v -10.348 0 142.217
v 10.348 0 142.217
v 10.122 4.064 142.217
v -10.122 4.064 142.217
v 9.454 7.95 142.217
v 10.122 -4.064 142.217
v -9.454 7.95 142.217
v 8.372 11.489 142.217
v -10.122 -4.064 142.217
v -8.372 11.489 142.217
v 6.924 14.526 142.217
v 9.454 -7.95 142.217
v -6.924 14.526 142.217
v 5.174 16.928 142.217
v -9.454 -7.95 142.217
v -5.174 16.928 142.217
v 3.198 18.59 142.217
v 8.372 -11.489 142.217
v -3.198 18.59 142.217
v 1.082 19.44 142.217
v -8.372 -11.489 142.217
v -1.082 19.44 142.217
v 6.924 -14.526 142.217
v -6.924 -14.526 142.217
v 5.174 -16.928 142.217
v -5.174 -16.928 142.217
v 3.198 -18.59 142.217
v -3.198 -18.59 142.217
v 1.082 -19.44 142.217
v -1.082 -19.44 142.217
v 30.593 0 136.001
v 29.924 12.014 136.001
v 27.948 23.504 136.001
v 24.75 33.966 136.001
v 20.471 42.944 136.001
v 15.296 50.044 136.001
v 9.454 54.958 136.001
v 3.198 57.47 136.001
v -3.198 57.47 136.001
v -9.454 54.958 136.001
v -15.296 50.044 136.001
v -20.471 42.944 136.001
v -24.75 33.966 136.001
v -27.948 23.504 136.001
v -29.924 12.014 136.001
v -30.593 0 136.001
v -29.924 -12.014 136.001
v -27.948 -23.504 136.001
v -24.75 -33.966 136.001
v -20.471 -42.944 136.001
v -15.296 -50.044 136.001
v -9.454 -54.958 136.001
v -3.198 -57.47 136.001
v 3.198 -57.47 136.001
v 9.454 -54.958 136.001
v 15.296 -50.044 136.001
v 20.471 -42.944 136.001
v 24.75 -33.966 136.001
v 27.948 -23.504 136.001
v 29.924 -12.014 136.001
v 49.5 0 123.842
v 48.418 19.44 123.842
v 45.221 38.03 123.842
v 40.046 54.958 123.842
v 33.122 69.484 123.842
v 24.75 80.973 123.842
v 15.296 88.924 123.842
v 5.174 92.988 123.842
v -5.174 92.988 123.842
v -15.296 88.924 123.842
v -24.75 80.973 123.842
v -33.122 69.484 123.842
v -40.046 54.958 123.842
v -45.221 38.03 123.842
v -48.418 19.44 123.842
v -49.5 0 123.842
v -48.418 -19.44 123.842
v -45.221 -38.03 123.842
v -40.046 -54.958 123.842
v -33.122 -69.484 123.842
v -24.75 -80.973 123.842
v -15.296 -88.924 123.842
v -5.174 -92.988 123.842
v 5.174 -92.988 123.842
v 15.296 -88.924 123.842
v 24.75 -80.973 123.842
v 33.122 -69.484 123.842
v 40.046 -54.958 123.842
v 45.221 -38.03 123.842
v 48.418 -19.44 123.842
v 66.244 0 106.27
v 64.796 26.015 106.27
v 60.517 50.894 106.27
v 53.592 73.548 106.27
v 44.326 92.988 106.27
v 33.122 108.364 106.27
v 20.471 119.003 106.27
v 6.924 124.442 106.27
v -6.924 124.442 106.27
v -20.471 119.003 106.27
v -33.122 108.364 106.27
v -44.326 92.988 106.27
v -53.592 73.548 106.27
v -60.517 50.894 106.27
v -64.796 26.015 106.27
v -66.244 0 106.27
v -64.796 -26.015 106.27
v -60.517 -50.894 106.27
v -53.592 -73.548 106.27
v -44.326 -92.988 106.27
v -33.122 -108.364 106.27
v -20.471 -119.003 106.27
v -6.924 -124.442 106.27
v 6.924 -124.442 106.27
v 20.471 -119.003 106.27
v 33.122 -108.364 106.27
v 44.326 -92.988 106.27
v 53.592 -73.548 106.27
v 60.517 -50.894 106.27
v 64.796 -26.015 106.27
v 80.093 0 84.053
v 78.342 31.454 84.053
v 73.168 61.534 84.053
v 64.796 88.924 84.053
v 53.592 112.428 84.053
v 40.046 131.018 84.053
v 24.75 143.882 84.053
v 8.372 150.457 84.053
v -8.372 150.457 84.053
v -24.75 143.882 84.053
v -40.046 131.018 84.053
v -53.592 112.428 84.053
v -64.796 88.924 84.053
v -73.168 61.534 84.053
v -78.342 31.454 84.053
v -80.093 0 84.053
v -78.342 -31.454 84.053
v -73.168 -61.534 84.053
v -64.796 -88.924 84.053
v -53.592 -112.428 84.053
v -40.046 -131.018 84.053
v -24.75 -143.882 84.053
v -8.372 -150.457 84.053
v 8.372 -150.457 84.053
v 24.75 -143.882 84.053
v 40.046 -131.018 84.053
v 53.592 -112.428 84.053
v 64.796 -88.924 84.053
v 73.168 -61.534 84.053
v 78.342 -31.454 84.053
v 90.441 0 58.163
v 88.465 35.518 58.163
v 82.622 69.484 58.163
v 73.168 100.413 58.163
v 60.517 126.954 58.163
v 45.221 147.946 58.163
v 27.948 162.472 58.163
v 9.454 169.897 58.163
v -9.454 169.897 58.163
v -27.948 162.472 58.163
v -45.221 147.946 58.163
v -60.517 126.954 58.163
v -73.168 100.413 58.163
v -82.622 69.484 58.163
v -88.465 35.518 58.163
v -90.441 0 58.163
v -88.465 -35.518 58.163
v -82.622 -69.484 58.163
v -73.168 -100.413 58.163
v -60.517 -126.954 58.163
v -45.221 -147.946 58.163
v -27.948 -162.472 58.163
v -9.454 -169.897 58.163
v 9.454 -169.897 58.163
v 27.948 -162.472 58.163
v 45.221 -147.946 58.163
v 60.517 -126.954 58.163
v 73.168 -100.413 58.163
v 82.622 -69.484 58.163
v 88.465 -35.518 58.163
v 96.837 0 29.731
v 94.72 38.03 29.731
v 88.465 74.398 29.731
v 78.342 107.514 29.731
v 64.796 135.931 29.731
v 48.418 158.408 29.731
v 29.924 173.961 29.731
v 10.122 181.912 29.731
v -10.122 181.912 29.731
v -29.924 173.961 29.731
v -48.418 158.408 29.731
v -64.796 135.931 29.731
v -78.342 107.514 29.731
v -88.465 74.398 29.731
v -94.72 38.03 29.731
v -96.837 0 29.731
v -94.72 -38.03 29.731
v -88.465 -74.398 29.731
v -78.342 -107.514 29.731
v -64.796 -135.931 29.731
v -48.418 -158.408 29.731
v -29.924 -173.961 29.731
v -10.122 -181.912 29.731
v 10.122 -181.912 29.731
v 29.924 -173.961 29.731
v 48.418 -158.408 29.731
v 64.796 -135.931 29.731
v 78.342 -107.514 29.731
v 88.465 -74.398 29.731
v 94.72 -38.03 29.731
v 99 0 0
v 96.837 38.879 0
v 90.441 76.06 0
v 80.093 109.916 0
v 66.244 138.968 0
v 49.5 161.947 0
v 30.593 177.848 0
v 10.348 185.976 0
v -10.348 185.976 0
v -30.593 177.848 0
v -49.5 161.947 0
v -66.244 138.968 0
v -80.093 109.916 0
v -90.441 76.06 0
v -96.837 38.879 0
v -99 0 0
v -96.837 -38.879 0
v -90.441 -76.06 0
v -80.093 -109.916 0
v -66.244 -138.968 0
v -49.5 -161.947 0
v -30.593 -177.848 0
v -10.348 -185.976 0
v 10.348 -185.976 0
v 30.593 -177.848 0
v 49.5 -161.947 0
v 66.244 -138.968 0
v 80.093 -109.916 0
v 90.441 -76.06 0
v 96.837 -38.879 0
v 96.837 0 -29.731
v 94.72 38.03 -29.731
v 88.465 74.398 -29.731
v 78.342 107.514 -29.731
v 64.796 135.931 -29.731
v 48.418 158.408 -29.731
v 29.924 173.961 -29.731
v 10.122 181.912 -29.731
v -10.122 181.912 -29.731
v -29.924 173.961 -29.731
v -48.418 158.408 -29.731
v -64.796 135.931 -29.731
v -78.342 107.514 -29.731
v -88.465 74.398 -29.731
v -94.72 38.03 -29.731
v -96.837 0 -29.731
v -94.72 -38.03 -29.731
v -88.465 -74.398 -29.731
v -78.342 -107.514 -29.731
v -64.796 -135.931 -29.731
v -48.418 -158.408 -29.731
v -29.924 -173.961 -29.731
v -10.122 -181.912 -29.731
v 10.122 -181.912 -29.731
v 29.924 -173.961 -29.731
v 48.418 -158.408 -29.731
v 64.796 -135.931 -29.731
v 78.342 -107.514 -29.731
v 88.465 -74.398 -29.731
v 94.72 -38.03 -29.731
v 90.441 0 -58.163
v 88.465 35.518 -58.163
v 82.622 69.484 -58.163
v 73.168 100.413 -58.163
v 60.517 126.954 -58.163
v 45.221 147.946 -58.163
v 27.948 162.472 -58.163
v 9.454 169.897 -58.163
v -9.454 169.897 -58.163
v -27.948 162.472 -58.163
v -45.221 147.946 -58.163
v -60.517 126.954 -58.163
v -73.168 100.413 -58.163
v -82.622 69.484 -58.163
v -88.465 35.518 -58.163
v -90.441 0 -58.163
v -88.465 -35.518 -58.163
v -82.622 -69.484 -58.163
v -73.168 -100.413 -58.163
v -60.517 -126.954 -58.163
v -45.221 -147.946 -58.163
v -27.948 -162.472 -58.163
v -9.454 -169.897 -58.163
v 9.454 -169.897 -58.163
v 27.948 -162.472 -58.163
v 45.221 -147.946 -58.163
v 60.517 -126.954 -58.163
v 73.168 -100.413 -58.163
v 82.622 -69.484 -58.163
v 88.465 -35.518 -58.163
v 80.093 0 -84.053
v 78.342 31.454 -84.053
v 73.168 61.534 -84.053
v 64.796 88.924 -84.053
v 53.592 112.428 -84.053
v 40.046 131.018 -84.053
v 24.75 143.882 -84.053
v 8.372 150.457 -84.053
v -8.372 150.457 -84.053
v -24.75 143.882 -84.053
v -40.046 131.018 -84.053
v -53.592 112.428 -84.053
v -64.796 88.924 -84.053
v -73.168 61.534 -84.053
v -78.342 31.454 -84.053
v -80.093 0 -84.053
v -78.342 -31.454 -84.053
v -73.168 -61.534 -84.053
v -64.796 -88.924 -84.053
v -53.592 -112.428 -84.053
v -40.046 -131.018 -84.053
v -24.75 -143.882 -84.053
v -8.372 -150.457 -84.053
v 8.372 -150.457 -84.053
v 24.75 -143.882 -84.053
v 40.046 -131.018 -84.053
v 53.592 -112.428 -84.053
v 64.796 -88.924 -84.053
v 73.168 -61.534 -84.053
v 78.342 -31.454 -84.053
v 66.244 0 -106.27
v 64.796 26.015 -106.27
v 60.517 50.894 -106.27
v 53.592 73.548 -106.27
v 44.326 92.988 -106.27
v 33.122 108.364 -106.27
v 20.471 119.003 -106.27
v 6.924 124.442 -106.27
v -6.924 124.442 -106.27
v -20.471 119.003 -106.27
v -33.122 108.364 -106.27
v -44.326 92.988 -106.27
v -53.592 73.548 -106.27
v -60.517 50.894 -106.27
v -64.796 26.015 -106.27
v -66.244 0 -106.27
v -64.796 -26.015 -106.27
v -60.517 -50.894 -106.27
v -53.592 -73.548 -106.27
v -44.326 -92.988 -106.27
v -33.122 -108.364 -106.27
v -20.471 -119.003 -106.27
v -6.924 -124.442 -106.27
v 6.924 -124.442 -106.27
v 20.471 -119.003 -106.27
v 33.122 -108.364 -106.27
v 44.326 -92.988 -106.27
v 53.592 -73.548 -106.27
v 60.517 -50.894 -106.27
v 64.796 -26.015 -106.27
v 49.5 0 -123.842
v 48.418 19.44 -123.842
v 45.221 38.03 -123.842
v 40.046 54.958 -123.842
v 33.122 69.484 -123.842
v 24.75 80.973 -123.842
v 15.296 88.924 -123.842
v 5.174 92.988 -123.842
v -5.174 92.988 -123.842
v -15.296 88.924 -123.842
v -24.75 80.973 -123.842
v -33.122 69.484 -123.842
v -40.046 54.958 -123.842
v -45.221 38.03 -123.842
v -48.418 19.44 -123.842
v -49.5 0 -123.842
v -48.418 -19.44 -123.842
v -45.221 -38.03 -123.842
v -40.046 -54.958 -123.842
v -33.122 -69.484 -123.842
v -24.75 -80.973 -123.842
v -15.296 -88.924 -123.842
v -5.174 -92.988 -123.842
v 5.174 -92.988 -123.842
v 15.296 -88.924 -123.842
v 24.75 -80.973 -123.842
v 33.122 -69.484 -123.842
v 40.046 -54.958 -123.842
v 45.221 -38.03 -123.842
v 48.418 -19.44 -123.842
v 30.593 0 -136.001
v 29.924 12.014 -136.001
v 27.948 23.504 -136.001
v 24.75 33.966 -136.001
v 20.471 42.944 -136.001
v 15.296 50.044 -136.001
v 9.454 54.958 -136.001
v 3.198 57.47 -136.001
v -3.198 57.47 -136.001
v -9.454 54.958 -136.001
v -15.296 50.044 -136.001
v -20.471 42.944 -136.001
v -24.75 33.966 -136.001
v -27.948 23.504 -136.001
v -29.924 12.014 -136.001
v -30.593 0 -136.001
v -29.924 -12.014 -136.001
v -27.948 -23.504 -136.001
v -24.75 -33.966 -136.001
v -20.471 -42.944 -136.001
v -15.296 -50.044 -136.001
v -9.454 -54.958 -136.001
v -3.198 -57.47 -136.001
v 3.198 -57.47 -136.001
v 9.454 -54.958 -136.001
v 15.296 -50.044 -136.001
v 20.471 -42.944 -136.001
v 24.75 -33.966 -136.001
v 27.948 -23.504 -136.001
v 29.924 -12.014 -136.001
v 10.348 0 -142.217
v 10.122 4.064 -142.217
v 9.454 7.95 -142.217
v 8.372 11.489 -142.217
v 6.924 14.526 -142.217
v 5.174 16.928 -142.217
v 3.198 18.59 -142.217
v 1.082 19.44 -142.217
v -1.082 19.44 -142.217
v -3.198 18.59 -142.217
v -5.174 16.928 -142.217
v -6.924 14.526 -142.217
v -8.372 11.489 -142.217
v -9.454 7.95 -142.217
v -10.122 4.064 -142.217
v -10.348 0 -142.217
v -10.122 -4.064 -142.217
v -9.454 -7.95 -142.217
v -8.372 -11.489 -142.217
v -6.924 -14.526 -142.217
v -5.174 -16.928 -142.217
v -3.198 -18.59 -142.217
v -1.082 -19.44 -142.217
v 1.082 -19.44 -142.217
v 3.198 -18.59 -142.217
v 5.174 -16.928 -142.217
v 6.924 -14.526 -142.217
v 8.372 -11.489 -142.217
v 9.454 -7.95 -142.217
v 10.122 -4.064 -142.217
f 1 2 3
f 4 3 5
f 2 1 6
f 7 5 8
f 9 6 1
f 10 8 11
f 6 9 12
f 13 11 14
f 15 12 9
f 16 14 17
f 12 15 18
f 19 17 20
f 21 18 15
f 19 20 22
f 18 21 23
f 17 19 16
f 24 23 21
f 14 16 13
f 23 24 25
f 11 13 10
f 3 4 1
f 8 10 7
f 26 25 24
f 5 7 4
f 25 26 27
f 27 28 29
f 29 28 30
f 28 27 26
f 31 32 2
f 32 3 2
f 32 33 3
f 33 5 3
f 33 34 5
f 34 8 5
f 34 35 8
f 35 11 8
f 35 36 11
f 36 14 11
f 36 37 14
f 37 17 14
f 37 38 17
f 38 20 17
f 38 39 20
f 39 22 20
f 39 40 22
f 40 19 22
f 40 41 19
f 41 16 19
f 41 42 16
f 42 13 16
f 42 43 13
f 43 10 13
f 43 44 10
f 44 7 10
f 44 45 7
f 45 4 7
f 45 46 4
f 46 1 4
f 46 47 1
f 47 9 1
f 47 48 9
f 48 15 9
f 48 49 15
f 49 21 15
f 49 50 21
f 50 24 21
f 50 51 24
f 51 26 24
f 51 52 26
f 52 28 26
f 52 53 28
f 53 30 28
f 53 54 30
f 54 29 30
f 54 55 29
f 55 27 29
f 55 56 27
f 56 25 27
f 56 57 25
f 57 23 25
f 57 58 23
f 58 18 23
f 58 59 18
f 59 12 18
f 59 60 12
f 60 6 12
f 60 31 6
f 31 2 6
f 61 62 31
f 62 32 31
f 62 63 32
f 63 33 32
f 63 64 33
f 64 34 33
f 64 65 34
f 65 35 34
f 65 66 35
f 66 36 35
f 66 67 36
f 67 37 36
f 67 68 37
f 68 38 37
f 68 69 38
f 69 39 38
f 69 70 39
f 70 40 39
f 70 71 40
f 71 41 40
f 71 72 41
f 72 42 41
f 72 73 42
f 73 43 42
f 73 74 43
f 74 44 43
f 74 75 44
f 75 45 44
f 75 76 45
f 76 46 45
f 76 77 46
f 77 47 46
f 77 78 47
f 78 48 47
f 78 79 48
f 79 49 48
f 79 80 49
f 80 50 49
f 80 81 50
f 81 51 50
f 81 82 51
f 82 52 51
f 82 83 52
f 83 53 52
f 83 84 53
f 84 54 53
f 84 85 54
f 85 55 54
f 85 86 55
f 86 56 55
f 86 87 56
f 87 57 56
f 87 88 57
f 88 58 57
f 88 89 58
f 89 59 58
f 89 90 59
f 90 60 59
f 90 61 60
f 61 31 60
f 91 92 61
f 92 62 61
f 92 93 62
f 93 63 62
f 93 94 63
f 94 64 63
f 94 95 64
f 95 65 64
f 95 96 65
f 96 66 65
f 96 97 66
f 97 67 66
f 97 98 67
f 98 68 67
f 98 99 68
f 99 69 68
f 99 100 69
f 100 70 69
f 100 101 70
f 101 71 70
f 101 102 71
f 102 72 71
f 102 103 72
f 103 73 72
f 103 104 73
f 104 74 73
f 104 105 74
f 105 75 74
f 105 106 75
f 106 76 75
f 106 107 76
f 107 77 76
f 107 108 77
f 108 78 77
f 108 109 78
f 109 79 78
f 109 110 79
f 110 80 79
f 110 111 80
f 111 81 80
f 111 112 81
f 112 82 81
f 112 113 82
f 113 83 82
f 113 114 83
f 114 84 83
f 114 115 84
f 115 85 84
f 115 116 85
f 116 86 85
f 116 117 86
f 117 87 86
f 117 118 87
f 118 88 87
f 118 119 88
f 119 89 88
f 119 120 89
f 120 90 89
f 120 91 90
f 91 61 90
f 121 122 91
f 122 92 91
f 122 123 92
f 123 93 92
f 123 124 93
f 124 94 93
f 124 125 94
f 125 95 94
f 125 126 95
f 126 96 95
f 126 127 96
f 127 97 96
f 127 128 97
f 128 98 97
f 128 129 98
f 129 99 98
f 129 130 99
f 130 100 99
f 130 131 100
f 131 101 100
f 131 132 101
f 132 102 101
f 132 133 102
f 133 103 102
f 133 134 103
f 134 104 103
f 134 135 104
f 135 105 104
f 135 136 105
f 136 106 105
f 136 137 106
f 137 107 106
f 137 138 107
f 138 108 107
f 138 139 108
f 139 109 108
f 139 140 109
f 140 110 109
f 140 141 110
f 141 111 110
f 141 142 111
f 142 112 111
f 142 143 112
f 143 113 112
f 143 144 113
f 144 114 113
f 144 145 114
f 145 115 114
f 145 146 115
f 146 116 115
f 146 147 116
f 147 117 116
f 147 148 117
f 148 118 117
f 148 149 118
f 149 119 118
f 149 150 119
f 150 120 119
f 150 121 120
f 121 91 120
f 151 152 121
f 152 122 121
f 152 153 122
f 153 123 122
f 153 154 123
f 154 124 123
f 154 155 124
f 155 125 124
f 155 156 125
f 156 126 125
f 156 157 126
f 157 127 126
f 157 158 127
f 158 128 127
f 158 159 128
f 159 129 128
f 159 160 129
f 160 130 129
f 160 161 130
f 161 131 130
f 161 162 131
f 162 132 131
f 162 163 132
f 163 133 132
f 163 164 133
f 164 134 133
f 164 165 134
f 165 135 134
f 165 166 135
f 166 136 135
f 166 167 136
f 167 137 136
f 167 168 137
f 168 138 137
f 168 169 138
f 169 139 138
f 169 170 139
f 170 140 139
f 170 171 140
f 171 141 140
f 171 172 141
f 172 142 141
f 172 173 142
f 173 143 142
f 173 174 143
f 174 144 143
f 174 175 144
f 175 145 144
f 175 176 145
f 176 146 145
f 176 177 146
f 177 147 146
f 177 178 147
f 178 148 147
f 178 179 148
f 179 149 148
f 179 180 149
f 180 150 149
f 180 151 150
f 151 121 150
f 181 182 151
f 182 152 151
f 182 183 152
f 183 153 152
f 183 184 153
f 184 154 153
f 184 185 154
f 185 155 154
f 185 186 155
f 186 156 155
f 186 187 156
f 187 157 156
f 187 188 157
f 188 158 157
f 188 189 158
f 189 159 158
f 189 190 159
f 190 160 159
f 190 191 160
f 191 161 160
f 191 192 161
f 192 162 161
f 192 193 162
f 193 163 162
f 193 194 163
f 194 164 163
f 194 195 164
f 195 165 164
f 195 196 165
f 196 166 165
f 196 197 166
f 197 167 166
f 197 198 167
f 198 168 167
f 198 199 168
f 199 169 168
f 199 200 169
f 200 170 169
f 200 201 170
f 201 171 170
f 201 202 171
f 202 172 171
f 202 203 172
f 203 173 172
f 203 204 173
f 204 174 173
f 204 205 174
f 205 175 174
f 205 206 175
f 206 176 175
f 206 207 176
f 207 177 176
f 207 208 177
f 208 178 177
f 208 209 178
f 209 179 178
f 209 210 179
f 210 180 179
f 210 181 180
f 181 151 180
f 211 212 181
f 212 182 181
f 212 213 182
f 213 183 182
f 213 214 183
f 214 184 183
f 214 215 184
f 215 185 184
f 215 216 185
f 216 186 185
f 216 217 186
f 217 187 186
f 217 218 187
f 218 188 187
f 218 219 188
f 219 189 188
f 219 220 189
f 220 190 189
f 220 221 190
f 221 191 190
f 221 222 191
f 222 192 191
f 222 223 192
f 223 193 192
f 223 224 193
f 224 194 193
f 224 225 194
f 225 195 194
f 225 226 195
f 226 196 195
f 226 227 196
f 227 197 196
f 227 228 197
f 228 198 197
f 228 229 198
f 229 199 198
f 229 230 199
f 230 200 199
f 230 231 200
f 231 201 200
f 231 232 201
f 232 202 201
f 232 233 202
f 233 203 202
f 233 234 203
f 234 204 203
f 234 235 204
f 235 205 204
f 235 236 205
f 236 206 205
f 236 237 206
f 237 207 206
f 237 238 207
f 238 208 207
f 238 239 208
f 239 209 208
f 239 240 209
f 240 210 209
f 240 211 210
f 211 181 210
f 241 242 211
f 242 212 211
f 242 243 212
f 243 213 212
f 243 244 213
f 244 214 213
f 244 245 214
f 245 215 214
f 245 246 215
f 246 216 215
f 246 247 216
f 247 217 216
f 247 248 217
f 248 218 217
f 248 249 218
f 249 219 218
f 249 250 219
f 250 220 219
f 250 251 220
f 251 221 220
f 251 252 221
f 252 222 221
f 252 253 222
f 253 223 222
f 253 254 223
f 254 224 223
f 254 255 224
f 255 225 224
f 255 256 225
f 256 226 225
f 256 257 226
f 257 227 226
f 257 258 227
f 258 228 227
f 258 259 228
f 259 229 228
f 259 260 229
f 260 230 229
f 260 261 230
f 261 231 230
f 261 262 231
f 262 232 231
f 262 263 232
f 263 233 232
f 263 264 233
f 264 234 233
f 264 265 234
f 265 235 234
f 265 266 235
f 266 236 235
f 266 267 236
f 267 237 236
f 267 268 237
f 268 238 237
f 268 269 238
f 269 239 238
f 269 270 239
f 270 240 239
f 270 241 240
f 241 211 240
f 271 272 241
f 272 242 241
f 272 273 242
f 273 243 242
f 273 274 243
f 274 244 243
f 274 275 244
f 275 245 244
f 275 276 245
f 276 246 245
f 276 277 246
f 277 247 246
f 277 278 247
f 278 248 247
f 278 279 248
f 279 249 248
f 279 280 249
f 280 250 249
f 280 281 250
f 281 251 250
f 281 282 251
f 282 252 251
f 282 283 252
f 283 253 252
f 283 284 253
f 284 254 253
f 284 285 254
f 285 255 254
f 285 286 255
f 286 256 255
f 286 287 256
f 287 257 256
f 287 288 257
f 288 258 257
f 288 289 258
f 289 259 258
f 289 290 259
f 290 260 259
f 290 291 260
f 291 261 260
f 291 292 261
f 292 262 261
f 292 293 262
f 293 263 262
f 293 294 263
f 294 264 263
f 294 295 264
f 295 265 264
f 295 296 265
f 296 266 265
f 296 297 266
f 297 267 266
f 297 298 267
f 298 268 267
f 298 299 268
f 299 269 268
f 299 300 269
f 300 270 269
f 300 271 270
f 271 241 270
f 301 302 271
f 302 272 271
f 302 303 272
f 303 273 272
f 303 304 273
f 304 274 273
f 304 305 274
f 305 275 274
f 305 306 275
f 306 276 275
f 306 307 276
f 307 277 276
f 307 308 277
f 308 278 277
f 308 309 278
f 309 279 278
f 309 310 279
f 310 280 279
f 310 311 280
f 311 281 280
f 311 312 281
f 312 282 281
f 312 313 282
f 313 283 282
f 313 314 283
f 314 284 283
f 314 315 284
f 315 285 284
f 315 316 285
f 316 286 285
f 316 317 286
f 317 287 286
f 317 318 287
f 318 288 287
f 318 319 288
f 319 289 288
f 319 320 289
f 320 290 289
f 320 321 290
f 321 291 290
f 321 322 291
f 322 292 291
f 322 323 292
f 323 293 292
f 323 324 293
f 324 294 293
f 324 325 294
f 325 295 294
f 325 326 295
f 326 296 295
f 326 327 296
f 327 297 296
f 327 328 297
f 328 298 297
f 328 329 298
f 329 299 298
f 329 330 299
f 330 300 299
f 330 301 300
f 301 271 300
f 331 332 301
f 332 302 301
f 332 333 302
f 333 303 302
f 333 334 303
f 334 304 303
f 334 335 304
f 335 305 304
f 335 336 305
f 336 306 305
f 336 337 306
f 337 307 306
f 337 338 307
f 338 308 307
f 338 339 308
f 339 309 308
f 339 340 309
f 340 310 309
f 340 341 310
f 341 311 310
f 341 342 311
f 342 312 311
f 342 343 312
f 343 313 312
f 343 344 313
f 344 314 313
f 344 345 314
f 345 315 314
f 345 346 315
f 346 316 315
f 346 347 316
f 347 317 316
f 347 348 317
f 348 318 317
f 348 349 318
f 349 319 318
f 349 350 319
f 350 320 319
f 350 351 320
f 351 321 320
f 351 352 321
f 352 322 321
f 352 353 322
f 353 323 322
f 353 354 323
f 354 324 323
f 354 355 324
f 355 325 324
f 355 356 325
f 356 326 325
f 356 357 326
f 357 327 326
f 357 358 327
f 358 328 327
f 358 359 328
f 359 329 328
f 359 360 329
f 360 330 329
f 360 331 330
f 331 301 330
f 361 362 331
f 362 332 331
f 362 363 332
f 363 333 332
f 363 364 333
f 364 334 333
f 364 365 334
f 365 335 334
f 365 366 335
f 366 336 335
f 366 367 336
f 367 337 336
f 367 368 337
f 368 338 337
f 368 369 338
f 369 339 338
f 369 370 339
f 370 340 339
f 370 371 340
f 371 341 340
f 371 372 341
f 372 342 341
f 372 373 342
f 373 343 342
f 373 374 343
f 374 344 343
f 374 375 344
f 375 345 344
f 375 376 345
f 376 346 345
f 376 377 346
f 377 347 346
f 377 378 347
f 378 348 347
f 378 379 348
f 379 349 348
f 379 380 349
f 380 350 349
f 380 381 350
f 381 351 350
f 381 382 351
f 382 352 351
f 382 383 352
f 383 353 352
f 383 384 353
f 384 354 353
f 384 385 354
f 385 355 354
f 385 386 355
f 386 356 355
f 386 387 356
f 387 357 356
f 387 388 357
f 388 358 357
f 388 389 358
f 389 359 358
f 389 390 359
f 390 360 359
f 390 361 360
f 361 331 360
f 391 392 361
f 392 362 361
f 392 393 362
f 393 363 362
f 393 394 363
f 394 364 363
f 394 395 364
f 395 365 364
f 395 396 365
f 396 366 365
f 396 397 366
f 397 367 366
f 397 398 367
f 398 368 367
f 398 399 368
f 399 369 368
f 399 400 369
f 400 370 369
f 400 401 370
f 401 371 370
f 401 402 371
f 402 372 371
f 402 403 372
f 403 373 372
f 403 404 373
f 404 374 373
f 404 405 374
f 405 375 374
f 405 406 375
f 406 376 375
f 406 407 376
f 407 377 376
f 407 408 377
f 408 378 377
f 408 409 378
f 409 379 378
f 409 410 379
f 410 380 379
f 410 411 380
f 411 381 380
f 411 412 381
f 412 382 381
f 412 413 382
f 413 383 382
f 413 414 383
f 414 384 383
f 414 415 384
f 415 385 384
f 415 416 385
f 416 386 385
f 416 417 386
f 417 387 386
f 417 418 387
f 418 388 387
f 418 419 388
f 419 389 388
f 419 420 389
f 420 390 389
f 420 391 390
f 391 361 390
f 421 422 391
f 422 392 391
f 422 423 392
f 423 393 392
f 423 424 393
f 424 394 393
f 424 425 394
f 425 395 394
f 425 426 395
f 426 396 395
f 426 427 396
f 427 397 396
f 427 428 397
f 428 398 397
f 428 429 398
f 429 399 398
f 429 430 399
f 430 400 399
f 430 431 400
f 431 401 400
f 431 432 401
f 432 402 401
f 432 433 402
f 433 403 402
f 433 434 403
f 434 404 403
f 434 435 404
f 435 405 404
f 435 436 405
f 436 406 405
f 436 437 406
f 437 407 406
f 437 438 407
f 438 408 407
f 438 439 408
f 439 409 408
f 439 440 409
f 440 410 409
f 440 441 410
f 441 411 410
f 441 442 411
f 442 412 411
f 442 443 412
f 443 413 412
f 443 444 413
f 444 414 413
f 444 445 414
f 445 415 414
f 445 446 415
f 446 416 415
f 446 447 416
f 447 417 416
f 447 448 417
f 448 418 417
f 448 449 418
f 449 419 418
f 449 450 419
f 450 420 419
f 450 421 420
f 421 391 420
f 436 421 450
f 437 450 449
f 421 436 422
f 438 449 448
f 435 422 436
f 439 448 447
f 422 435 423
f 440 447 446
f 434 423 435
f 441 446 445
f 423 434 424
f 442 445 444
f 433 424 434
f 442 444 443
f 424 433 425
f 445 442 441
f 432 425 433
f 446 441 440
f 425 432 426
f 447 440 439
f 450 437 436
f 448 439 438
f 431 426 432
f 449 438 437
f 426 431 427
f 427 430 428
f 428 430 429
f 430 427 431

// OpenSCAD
// Generated by SolidPython 1.0.1 on 2020-07-29 00:46:49


scale(v = [9, 17, 13]) {
	sphere(r = 11);
}
/***********************************************
*********      SolidPython code:      **********
************************************************
 
# import packages: SolidPython
from solid import *
from solid.utils import *
from itertools import chain, combinations, permutations


class Resize:

    def __init__(self, scad_file):
        self.scad_file = scad_file
        #self.scad_file = import_scad(scad_file)
        # cone/cylinder param:
        self.r1 = 0
        self.r2 = 0
        self.h = 0
        # rectangular prism param:
        self.w = 0
        self.l = 0
        # ellipse param:
        self.r = 0

    # import OpenScad code (file name corresponds to shape)


    # classify shape + parameters
    def assign(self, param1, param2, param3):
        if self.scad_file == 'cone.scad':
            self.r1 = param1
            self.r2 = param2
            self.h = param3
        elif self.scad_file == 'cylinder.scad':
            self.r1 = param1
            self.r2 = param2
            self.h = param3
        elif self.scad_file == 'rectangularPrism.scad':
            self.h = param1
            self.l = param2
            self.w = param3
        else:
            self.r = param1
            self.h = param2

    # resize parameters
    def iterate(self):
        x = range(3, 20, 2)
        i = 1
        if self.scad_file == 'cone.scad':
            tempList = list(permutations(x, 2))
            for temp in tempList:
                param1 = temp[0]
                param2 = temp[1]
                filepath = 'produced_scad_files/' + 'cone' + str(param1) + '_' + str(param2) + '_' + '.scad'
                scad_render_to_file(cylinder(h=param1, r1=param2, r2=0), filepath)

        elif self.scad_file == 'cylinder.scad':
            tempList = list(permutations(x, 3))
            for temp in tempList:
                param1 = temp[0]
                param2 = temp[1]
                filepath = 'produced_scad_files/' + 'cylinder' + str(param1) + '_' + str(param2) + '_' + '.scad'
                scad_render_to_file(cylinder(h=param1, r1=param2, r2=param2), filepath)

        elif self.scad_file == 'rectangularPrism.scad':
            tempList = list(permutations(x, 3))
            for temp in tempList:
                param1 = temp[0]
                param2 = temp[1]
                param3 = temp[2]
                filepath = 'produced_scad_files/' + 'rectangularPrism' + str(param1) + '_' + str(param2) + '_' + str(
                    param3) + '.scad'
                scad_render_to_file(cube(size=(param1, param2, param3)), filepath)

        elif self.scad_file == 'ellipse.scad':
            tempList = list(permutations(x, 4))
            for temp in tempList:
                param1 = temp[0]
                param2 = temp[1]
                param3 = temp[2]
                param4 = temp[3]
                filepath = 'produced_scad_files/' + 'ellipse' + str(param1) + '_' + str(param2) + '_' + str(param3) + '_' + str(param4) + '.scad'
                scad_render_to_file(scale([param1, param2, param3])(sphere(r=param4)), filepath)

    def render_to_scadfile(self):
        scad_render_to_file(scad, 'example.scad') 
 
************************************************/
